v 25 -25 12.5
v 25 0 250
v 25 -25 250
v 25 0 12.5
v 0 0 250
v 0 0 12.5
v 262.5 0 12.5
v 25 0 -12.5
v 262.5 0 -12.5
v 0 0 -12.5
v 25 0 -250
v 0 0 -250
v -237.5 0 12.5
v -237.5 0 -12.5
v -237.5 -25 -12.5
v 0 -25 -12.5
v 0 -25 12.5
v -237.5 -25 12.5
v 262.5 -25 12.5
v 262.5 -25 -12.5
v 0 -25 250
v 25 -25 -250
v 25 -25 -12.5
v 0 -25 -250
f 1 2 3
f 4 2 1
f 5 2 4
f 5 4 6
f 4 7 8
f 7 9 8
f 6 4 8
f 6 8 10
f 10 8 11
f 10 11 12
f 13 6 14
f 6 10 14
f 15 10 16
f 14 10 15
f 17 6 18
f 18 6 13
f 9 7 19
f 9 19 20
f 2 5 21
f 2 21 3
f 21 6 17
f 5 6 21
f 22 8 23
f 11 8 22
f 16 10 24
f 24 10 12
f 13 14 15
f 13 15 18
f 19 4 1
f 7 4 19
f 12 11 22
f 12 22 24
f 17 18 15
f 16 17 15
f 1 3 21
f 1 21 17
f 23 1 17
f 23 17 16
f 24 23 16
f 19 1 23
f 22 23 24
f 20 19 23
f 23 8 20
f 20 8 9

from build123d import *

# Parameters (mm, degrees)
F0_W     = 25
F0_H     = 250
F1_DEPTH = 25
F3_COUNT = 4


with BuildPart() as f1:
    # F0 (on Front) → F1 (new body)
    with BuildSketch(Plane.XZ):
        with Locations((12.5, 125)):
            Rectangle(F0_W, F0_H)
    extrude(amount=F1_DEPTH)


with BuildPart() as f3_1:
    # F3: instance of F1
    add(f1.part.rotate(Axis((12.5, -12.5, 0), (0, -1, 0)), 1 * 360 / F3_COUNT))


with BuildPart() as f3_2:
    # F3: instance of F1
    add(f1.part.rotate(Axis((12.5, -12.5, 0), (0, -1, 0)), 2 * 360 / F3_COUNT))


with BuildPart() as f3_3:
    # F3: instance of F1
    add(f1.part.rotate(Axis((12.5, -12.5, 0), (0, -1, 0)), 3 * 360 / F3_COUNT))


with BuildPart() as f3_2_1:
    add(f3_2.part)

    # F4: union F3_1, F1, F3_3
    add(f3_1.part)
    add(f1.part)
    add(f3_3.part)


solid = f3_2_1.part
